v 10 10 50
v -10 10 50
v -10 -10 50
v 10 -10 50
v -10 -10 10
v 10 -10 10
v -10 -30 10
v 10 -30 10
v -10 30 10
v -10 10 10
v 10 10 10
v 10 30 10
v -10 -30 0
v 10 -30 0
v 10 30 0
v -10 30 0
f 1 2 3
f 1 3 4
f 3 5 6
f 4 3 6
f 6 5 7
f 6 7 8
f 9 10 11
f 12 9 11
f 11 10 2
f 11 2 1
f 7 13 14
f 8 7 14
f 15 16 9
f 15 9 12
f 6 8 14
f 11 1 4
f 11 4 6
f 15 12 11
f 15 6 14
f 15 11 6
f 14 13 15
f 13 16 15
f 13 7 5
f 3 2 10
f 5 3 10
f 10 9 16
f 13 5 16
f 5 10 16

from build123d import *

# Parameters (mm, degrees)
SKETCH1_W           = 20
SKETCH1_H           = 20
BOSS_EXTRUDE1_DEPTH = 50
SKETCH3_W           = 20
SKETCH3_H           = 10
BOSS_EXTRUDE3_DEPTH = 20


with BuildPart() as part:
    # Sketch1 → Boss-Extrude1 (new body)
    with BuildSketch(Plane.XY):
        Rectangle(SKETCH1_W, SKETCH1_H)
    extrude(amount=BOSS_EXTRUDE1_DEPTH)

    # Sketch3 → Boss-Extrude3 (add)
    with BuildSketch(Plane(origin=(0, 10, 0), x_dir=(1, 0, 0), z_dir=(0, 1, 0))):
        with Locations((0, -5)):
            Rectangle(SKETCH3_W, SKETCH3_H)
    boss_extrude3 = extrude(amount=BOSS_EXTRUDE3_DEPTH)

    # Mirror2: Boss-Extrude3 across plane
    add(boss_extrude3.mirror(Plane.ZX))


solid = part.part
